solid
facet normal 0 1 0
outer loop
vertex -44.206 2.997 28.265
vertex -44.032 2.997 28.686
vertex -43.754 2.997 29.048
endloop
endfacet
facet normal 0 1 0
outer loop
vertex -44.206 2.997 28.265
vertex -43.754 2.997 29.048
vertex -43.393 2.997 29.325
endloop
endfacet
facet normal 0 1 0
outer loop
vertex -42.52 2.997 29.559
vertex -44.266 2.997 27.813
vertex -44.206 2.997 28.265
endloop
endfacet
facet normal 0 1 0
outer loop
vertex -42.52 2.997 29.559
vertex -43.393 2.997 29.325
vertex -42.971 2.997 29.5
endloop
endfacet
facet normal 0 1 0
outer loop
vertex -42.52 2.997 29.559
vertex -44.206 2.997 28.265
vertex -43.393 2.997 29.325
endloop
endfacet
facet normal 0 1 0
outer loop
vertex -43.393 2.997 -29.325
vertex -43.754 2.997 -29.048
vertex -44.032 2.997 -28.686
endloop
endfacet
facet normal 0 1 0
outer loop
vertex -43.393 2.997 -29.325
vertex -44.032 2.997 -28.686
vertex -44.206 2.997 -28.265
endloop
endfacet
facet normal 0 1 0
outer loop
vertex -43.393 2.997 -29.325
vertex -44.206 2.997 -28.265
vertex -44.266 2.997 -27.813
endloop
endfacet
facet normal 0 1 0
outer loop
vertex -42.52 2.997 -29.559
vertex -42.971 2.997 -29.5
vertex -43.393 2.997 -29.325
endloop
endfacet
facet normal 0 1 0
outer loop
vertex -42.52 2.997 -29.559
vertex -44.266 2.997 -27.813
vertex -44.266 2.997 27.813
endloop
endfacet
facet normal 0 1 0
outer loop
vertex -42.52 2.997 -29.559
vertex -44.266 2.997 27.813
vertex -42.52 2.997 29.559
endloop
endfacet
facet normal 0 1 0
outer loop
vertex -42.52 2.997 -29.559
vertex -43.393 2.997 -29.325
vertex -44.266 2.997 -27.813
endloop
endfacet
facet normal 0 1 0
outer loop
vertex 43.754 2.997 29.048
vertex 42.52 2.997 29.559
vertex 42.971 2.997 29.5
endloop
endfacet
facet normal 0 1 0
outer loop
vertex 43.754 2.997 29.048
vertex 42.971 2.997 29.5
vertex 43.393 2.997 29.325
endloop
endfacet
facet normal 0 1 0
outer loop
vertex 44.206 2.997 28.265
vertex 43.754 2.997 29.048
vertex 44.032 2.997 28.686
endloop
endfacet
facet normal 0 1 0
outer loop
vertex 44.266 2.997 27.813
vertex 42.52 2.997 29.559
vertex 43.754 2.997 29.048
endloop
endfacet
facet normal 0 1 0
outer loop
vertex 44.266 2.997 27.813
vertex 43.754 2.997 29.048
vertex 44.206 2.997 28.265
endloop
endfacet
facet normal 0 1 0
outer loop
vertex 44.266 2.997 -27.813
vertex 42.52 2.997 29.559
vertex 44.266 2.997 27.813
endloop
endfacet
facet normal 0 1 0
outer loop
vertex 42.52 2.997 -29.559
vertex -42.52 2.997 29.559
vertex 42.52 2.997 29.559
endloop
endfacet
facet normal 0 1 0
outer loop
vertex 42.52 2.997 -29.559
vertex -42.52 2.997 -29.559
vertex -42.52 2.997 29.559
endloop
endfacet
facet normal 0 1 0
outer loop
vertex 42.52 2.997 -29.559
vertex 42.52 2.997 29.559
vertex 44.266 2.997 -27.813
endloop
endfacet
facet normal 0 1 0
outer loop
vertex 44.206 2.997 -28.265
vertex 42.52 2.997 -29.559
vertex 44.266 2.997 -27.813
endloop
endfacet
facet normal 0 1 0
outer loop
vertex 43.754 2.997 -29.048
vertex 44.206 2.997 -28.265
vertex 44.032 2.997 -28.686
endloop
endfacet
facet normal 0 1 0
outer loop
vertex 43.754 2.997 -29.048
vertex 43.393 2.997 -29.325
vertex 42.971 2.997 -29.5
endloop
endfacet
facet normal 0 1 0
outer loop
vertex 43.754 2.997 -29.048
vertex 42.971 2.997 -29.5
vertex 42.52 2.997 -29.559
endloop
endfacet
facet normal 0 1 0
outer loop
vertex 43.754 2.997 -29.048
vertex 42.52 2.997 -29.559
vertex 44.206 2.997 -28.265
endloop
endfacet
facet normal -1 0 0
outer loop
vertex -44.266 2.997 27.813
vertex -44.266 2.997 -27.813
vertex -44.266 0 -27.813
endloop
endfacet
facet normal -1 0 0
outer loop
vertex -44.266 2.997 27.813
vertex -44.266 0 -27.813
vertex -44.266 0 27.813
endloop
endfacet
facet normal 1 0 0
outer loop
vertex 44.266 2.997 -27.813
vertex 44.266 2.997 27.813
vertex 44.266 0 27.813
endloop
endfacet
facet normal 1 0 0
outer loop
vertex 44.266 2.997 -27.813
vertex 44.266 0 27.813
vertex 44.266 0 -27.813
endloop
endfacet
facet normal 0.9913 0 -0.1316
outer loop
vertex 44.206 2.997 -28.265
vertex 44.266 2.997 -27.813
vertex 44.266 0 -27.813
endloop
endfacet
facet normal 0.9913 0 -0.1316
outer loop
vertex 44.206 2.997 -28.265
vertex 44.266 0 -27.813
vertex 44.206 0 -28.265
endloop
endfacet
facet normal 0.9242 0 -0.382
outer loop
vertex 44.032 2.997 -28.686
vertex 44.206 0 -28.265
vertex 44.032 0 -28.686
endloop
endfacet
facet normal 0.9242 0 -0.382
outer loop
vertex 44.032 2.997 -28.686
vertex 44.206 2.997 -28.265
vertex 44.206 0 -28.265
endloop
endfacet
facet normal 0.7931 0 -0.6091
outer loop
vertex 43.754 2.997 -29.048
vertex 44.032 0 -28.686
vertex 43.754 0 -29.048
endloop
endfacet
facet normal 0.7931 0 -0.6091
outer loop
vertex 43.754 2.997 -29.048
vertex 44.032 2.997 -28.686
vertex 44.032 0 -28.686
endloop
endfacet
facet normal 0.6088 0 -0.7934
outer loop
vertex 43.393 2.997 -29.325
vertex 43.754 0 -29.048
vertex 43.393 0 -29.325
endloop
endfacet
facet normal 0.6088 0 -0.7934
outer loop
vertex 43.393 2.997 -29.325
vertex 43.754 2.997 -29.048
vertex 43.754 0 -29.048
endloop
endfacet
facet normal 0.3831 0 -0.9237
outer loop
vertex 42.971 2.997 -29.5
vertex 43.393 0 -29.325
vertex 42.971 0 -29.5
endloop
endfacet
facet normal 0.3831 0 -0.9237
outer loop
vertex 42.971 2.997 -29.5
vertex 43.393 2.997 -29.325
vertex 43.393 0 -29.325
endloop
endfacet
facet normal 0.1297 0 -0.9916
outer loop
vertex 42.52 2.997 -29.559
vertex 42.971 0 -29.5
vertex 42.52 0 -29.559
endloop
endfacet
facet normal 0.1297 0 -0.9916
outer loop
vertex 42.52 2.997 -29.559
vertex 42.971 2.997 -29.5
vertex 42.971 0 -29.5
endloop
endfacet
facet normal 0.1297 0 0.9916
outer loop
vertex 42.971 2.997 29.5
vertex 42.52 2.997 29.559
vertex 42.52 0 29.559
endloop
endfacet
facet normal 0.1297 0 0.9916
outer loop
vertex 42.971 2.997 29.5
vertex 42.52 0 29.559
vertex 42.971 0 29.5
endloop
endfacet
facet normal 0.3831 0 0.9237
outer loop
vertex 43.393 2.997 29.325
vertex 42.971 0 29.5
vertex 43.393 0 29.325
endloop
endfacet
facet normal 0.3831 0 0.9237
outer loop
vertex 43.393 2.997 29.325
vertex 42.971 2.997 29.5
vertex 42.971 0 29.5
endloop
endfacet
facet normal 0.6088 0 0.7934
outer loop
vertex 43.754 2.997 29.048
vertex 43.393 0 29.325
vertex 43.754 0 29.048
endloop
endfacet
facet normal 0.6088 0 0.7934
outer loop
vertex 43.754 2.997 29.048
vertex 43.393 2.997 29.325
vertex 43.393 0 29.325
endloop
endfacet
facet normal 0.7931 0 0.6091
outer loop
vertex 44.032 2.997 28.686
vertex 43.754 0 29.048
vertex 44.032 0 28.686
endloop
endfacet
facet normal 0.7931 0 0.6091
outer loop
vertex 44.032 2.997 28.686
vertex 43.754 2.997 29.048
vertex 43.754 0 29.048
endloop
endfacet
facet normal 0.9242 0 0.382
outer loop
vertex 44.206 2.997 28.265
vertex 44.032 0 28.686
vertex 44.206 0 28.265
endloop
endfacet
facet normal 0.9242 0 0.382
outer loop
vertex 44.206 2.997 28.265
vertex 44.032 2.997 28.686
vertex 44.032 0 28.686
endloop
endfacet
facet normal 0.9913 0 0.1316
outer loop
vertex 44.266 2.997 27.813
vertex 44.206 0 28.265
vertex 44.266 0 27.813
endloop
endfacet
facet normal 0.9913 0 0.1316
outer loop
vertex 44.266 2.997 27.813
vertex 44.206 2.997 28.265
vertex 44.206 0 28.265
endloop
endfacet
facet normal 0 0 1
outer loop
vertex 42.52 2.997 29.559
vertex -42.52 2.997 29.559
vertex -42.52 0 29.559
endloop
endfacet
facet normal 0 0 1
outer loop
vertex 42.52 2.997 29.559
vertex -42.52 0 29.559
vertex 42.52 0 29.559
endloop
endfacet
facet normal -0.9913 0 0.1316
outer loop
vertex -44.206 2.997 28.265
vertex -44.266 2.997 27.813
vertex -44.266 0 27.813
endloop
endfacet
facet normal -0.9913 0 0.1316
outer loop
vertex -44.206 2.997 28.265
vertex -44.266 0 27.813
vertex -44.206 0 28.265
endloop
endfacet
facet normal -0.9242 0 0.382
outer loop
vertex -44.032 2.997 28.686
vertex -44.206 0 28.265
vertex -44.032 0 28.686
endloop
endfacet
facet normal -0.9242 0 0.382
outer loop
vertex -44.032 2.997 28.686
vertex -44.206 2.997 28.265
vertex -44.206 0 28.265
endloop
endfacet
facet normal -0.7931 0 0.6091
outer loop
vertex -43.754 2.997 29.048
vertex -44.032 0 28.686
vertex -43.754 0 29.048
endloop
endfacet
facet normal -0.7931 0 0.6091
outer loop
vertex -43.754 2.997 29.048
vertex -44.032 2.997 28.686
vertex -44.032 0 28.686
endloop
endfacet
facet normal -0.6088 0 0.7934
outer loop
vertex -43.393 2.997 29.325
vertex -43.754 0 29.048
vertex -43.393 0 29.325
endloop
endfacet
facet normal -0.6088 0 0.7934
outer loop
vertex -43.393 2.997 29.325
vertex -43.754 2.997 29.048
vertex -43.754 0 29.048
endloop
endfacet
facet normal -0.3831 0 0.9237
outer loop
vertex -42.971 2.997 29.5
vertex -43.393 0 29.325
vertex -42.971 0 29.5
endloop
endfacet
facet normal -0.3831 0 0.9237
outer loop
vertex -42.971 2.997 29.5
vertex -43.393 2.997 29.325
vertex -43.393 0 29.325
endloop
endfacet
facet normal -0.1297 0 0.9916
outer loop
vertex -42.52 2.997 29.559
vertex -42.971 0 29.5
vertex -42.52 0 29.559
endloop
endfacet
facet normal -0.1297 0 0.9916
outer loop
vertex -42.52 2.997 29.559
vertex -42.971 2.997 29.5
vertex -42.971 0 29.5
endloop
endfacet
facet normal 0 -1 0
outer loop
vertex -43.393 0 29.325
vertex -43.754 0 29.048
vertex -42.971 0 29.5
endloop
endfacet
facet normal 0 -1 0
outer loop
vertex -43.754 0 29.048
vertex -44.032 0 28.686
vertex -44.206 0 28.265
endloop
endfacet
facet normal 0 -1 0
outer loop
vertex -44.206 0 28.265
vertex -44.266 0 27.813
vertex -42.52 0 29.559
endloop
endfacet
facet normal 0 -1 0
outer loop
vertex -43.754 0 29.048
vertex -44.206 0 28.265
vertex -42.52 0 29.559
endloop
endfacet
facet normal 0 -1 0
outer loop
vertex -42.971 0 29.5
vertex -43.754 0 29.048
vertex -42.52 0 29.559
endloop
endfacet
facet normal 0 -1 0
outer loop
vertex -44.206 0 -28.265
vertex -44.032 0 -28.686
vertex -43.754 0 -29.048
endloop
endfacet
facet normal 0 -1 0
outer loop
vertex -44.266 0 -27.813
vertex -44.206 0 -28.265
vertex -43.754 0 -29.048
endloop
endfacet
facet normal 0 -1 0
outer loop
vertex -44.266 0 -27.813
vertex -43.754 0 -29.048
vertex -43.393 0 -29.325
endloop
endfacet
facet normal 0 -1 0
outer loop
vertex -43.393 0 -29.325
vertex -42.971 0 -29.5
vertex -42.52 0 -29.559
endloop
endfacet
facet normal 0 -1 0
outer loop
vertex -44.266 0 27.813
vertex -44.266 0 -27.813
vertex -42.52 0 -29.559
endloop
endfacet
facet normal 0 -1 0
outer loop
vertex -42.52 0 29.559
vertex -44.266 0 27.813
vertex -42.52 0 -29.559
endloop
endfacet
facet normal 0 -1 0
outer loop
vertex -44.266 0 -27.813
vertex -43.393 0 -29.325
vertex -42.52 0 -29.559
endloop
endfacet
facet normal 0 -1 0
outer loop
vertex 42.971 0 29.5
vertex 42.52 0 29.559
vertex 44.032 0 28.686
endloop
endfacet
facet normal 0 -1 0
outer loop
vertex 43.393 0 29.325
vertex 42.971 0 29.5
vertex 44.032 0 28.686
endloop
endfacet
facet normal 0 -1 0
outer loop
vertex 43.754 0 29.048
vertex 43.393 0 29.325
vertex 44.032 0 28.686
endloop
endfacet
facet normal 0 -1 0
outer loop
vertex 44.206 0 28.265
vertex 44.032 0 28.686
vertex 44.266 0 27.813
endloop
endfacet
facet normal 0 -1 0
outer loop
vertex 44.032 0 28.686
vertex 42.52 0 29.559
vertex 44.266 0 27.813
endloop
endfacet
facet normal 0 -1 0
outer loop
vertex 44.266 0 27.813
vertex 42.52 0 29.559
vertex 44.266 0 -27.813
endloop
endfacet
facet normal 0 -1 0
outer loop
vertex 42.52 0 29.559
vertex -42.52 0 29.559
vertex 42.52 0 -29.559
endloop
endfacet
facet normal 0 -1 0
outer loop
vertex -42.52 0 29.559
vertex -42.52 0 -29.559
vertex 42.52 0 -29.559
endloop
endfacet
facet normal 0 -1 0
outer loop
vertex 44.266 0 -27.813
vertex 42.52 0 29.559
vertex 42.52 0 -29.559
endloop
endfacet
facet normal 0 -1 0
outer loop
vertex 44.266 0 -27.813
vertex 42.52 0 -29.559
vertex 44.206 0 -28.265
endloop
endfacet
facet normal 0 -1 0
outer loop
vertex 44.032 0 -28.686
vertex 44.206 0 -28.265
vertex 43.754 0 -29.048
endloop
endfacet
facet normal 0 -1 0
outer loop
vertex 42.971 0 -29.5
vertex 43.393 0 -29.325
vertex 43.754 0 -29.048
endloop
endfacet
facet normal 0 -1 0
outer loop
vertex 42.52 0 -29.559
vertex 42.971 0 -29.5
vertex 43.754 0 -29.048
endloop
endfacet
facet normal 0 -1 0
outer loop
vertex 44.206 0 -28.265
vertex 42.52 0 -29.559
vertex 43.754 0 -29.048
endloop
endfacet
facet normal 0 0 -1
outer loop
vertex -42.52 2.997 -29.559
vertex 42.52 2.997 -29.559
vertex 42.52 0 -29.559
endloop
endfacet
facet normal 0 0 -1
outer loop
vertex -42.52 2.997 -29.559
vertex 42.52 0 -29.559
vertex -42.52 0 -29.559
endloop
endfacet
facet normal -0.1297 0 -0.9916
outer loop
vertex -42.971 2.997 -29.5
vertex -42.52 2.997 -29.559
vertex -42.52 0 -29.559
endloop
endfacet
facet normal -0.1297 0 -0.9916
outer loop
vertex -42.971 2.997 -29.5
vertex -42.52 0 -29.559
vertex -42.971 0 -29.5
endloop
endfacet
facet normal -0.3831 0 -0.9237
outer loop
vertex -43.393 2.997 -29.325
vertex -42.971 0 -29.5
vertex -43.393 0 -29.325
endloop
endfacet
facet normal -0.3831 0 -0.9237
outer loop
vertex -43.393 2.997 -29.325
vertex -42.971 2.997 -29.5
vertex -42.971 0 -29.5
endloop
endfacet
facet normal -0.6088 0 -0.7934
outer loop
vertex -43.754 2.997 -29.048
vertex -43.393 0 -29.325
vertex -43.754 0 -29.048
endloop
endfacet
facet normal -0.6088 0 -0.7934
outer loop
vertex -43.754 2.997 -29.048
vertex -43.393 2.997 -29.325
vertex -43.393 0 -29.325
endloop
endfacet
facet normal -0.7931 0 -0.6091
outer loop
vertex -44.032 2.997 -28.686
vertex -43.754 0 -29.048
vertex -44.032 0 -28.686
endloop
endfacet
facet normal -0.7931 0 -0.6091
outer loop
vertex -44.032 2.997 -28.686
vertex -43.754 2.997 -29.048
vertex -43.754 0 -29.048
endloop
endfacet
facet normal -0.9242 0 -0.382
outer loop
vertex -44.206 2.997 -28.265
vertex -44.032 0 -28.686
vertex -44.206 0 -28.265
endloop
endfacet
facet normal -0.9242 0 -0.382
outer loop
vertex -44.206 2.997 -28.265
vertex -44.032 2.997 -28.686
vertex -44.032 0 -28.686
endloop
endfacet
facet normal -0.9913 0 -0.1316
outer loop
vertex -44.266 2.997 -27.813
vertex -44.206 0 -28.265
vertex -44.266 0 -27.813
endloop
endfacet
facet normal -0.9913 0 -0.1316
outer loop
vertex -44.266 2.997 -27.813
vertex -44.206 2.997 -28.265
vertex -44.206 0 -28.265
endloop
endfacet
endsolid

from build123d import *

# Parameters (mm, degrees)
SKETCH1_W           = 89.0392
SKETCH1_H           = 59.626
BOSS_EXTRUDE1_DEPTH = 2.9972
FILLET1_R           = 2
CUT_EXTRUDE1_DEPTH  = 3.9972


with BuildPart() as part:
    # Sketch1 → Boss-Extrude1 (new body)
    with BuildSketch(Plane(origin=(0, 0, 0), x_dir=(1, 0, 0), z_dir=(0, 1, 0))):
        Rectangle(SKETCH1_W, SKETCH1_H)
    extrude(amount=BOSS_EXTRUDE1_DEPTH)

    # Fillet1
    fillet1_edges = [part.edges().sort_by_distance(p)[0] for p in [
        (44.5196, 1.4986, 29.813),
        (-44.5196, 1.4986, 29.813),
        (-44.5196, 1.4986, -29.813),
        (44.5196, 1.4986, -29.813),
    ]]
    fillet(fillet1_edges, radius=FILLET1_R)

    # Sketch2 → Cut-Extrude1 (cut, through all)
    with BuildSketch(Plane(origin=(0, 2.9972, 0), x_dir=(1, 0, 0), z_dir=(0, 1, 0))):
        with BuildLine():
            ThreePointArc((-42.5196, 29.813), (-43.933813562, 29.227213562), (-44.5196, 27.813))
            Line((-44.5196, 27.813), (-44.5196, -27.813))
            ThreePointArc((-44.5196, -27.813), (-43.933813562, -29.227213562), (-42.5196, -29.813))
            Line((-42.5196, -29.813), (42.5196, -29.813))
            ThreePointArc((42.5196, -29.813), (43.933813562, -29.227213562), (44.5196, -27.813))
            Line((44.5196, -27.813), (44.5196, 27.813))
            ThreePointArc((44.5196, 27.813), (43.933813562, 29.227213562), (42.5196, 29.813))
            Line((42.5196, 29.813), (-42.5196, 29.813))
        make_face()
        with BuildLine():
            ThreePointArc((-42.5196, 29.559), (-43.75420844, 29.04760844), (-44.2656, 27.813))
            Line((-44.2656, 27.813), (-44.2656, -27.813))
            ThreePointArc((-44.2656, -27.813), (-43.75420844, -29.04760844), (-42.5196, -29.559))
            Line((-42.5196, -29.559), (42.5196, -29.559))
            ThreePointArc((42.5196, -29.559), (43.75420844, -29.04760844), (44.2656, -27.813))
            Line((44.2656, -27.813), (44.2656, 27.813))
            ThreePointArc((44.2656, 27.813), (43.75420844, 29.04760844), (42.5196, 29.559))
            Line((42.5196, 29.559), (-42.5196, 29.559))
        make_face(mode=Mode.SUBTRACT)
    extrude(amount=-CUT_EXTRUDE1_DEPTH, mode=Mode.SUBTRACT)


solid = part.part
